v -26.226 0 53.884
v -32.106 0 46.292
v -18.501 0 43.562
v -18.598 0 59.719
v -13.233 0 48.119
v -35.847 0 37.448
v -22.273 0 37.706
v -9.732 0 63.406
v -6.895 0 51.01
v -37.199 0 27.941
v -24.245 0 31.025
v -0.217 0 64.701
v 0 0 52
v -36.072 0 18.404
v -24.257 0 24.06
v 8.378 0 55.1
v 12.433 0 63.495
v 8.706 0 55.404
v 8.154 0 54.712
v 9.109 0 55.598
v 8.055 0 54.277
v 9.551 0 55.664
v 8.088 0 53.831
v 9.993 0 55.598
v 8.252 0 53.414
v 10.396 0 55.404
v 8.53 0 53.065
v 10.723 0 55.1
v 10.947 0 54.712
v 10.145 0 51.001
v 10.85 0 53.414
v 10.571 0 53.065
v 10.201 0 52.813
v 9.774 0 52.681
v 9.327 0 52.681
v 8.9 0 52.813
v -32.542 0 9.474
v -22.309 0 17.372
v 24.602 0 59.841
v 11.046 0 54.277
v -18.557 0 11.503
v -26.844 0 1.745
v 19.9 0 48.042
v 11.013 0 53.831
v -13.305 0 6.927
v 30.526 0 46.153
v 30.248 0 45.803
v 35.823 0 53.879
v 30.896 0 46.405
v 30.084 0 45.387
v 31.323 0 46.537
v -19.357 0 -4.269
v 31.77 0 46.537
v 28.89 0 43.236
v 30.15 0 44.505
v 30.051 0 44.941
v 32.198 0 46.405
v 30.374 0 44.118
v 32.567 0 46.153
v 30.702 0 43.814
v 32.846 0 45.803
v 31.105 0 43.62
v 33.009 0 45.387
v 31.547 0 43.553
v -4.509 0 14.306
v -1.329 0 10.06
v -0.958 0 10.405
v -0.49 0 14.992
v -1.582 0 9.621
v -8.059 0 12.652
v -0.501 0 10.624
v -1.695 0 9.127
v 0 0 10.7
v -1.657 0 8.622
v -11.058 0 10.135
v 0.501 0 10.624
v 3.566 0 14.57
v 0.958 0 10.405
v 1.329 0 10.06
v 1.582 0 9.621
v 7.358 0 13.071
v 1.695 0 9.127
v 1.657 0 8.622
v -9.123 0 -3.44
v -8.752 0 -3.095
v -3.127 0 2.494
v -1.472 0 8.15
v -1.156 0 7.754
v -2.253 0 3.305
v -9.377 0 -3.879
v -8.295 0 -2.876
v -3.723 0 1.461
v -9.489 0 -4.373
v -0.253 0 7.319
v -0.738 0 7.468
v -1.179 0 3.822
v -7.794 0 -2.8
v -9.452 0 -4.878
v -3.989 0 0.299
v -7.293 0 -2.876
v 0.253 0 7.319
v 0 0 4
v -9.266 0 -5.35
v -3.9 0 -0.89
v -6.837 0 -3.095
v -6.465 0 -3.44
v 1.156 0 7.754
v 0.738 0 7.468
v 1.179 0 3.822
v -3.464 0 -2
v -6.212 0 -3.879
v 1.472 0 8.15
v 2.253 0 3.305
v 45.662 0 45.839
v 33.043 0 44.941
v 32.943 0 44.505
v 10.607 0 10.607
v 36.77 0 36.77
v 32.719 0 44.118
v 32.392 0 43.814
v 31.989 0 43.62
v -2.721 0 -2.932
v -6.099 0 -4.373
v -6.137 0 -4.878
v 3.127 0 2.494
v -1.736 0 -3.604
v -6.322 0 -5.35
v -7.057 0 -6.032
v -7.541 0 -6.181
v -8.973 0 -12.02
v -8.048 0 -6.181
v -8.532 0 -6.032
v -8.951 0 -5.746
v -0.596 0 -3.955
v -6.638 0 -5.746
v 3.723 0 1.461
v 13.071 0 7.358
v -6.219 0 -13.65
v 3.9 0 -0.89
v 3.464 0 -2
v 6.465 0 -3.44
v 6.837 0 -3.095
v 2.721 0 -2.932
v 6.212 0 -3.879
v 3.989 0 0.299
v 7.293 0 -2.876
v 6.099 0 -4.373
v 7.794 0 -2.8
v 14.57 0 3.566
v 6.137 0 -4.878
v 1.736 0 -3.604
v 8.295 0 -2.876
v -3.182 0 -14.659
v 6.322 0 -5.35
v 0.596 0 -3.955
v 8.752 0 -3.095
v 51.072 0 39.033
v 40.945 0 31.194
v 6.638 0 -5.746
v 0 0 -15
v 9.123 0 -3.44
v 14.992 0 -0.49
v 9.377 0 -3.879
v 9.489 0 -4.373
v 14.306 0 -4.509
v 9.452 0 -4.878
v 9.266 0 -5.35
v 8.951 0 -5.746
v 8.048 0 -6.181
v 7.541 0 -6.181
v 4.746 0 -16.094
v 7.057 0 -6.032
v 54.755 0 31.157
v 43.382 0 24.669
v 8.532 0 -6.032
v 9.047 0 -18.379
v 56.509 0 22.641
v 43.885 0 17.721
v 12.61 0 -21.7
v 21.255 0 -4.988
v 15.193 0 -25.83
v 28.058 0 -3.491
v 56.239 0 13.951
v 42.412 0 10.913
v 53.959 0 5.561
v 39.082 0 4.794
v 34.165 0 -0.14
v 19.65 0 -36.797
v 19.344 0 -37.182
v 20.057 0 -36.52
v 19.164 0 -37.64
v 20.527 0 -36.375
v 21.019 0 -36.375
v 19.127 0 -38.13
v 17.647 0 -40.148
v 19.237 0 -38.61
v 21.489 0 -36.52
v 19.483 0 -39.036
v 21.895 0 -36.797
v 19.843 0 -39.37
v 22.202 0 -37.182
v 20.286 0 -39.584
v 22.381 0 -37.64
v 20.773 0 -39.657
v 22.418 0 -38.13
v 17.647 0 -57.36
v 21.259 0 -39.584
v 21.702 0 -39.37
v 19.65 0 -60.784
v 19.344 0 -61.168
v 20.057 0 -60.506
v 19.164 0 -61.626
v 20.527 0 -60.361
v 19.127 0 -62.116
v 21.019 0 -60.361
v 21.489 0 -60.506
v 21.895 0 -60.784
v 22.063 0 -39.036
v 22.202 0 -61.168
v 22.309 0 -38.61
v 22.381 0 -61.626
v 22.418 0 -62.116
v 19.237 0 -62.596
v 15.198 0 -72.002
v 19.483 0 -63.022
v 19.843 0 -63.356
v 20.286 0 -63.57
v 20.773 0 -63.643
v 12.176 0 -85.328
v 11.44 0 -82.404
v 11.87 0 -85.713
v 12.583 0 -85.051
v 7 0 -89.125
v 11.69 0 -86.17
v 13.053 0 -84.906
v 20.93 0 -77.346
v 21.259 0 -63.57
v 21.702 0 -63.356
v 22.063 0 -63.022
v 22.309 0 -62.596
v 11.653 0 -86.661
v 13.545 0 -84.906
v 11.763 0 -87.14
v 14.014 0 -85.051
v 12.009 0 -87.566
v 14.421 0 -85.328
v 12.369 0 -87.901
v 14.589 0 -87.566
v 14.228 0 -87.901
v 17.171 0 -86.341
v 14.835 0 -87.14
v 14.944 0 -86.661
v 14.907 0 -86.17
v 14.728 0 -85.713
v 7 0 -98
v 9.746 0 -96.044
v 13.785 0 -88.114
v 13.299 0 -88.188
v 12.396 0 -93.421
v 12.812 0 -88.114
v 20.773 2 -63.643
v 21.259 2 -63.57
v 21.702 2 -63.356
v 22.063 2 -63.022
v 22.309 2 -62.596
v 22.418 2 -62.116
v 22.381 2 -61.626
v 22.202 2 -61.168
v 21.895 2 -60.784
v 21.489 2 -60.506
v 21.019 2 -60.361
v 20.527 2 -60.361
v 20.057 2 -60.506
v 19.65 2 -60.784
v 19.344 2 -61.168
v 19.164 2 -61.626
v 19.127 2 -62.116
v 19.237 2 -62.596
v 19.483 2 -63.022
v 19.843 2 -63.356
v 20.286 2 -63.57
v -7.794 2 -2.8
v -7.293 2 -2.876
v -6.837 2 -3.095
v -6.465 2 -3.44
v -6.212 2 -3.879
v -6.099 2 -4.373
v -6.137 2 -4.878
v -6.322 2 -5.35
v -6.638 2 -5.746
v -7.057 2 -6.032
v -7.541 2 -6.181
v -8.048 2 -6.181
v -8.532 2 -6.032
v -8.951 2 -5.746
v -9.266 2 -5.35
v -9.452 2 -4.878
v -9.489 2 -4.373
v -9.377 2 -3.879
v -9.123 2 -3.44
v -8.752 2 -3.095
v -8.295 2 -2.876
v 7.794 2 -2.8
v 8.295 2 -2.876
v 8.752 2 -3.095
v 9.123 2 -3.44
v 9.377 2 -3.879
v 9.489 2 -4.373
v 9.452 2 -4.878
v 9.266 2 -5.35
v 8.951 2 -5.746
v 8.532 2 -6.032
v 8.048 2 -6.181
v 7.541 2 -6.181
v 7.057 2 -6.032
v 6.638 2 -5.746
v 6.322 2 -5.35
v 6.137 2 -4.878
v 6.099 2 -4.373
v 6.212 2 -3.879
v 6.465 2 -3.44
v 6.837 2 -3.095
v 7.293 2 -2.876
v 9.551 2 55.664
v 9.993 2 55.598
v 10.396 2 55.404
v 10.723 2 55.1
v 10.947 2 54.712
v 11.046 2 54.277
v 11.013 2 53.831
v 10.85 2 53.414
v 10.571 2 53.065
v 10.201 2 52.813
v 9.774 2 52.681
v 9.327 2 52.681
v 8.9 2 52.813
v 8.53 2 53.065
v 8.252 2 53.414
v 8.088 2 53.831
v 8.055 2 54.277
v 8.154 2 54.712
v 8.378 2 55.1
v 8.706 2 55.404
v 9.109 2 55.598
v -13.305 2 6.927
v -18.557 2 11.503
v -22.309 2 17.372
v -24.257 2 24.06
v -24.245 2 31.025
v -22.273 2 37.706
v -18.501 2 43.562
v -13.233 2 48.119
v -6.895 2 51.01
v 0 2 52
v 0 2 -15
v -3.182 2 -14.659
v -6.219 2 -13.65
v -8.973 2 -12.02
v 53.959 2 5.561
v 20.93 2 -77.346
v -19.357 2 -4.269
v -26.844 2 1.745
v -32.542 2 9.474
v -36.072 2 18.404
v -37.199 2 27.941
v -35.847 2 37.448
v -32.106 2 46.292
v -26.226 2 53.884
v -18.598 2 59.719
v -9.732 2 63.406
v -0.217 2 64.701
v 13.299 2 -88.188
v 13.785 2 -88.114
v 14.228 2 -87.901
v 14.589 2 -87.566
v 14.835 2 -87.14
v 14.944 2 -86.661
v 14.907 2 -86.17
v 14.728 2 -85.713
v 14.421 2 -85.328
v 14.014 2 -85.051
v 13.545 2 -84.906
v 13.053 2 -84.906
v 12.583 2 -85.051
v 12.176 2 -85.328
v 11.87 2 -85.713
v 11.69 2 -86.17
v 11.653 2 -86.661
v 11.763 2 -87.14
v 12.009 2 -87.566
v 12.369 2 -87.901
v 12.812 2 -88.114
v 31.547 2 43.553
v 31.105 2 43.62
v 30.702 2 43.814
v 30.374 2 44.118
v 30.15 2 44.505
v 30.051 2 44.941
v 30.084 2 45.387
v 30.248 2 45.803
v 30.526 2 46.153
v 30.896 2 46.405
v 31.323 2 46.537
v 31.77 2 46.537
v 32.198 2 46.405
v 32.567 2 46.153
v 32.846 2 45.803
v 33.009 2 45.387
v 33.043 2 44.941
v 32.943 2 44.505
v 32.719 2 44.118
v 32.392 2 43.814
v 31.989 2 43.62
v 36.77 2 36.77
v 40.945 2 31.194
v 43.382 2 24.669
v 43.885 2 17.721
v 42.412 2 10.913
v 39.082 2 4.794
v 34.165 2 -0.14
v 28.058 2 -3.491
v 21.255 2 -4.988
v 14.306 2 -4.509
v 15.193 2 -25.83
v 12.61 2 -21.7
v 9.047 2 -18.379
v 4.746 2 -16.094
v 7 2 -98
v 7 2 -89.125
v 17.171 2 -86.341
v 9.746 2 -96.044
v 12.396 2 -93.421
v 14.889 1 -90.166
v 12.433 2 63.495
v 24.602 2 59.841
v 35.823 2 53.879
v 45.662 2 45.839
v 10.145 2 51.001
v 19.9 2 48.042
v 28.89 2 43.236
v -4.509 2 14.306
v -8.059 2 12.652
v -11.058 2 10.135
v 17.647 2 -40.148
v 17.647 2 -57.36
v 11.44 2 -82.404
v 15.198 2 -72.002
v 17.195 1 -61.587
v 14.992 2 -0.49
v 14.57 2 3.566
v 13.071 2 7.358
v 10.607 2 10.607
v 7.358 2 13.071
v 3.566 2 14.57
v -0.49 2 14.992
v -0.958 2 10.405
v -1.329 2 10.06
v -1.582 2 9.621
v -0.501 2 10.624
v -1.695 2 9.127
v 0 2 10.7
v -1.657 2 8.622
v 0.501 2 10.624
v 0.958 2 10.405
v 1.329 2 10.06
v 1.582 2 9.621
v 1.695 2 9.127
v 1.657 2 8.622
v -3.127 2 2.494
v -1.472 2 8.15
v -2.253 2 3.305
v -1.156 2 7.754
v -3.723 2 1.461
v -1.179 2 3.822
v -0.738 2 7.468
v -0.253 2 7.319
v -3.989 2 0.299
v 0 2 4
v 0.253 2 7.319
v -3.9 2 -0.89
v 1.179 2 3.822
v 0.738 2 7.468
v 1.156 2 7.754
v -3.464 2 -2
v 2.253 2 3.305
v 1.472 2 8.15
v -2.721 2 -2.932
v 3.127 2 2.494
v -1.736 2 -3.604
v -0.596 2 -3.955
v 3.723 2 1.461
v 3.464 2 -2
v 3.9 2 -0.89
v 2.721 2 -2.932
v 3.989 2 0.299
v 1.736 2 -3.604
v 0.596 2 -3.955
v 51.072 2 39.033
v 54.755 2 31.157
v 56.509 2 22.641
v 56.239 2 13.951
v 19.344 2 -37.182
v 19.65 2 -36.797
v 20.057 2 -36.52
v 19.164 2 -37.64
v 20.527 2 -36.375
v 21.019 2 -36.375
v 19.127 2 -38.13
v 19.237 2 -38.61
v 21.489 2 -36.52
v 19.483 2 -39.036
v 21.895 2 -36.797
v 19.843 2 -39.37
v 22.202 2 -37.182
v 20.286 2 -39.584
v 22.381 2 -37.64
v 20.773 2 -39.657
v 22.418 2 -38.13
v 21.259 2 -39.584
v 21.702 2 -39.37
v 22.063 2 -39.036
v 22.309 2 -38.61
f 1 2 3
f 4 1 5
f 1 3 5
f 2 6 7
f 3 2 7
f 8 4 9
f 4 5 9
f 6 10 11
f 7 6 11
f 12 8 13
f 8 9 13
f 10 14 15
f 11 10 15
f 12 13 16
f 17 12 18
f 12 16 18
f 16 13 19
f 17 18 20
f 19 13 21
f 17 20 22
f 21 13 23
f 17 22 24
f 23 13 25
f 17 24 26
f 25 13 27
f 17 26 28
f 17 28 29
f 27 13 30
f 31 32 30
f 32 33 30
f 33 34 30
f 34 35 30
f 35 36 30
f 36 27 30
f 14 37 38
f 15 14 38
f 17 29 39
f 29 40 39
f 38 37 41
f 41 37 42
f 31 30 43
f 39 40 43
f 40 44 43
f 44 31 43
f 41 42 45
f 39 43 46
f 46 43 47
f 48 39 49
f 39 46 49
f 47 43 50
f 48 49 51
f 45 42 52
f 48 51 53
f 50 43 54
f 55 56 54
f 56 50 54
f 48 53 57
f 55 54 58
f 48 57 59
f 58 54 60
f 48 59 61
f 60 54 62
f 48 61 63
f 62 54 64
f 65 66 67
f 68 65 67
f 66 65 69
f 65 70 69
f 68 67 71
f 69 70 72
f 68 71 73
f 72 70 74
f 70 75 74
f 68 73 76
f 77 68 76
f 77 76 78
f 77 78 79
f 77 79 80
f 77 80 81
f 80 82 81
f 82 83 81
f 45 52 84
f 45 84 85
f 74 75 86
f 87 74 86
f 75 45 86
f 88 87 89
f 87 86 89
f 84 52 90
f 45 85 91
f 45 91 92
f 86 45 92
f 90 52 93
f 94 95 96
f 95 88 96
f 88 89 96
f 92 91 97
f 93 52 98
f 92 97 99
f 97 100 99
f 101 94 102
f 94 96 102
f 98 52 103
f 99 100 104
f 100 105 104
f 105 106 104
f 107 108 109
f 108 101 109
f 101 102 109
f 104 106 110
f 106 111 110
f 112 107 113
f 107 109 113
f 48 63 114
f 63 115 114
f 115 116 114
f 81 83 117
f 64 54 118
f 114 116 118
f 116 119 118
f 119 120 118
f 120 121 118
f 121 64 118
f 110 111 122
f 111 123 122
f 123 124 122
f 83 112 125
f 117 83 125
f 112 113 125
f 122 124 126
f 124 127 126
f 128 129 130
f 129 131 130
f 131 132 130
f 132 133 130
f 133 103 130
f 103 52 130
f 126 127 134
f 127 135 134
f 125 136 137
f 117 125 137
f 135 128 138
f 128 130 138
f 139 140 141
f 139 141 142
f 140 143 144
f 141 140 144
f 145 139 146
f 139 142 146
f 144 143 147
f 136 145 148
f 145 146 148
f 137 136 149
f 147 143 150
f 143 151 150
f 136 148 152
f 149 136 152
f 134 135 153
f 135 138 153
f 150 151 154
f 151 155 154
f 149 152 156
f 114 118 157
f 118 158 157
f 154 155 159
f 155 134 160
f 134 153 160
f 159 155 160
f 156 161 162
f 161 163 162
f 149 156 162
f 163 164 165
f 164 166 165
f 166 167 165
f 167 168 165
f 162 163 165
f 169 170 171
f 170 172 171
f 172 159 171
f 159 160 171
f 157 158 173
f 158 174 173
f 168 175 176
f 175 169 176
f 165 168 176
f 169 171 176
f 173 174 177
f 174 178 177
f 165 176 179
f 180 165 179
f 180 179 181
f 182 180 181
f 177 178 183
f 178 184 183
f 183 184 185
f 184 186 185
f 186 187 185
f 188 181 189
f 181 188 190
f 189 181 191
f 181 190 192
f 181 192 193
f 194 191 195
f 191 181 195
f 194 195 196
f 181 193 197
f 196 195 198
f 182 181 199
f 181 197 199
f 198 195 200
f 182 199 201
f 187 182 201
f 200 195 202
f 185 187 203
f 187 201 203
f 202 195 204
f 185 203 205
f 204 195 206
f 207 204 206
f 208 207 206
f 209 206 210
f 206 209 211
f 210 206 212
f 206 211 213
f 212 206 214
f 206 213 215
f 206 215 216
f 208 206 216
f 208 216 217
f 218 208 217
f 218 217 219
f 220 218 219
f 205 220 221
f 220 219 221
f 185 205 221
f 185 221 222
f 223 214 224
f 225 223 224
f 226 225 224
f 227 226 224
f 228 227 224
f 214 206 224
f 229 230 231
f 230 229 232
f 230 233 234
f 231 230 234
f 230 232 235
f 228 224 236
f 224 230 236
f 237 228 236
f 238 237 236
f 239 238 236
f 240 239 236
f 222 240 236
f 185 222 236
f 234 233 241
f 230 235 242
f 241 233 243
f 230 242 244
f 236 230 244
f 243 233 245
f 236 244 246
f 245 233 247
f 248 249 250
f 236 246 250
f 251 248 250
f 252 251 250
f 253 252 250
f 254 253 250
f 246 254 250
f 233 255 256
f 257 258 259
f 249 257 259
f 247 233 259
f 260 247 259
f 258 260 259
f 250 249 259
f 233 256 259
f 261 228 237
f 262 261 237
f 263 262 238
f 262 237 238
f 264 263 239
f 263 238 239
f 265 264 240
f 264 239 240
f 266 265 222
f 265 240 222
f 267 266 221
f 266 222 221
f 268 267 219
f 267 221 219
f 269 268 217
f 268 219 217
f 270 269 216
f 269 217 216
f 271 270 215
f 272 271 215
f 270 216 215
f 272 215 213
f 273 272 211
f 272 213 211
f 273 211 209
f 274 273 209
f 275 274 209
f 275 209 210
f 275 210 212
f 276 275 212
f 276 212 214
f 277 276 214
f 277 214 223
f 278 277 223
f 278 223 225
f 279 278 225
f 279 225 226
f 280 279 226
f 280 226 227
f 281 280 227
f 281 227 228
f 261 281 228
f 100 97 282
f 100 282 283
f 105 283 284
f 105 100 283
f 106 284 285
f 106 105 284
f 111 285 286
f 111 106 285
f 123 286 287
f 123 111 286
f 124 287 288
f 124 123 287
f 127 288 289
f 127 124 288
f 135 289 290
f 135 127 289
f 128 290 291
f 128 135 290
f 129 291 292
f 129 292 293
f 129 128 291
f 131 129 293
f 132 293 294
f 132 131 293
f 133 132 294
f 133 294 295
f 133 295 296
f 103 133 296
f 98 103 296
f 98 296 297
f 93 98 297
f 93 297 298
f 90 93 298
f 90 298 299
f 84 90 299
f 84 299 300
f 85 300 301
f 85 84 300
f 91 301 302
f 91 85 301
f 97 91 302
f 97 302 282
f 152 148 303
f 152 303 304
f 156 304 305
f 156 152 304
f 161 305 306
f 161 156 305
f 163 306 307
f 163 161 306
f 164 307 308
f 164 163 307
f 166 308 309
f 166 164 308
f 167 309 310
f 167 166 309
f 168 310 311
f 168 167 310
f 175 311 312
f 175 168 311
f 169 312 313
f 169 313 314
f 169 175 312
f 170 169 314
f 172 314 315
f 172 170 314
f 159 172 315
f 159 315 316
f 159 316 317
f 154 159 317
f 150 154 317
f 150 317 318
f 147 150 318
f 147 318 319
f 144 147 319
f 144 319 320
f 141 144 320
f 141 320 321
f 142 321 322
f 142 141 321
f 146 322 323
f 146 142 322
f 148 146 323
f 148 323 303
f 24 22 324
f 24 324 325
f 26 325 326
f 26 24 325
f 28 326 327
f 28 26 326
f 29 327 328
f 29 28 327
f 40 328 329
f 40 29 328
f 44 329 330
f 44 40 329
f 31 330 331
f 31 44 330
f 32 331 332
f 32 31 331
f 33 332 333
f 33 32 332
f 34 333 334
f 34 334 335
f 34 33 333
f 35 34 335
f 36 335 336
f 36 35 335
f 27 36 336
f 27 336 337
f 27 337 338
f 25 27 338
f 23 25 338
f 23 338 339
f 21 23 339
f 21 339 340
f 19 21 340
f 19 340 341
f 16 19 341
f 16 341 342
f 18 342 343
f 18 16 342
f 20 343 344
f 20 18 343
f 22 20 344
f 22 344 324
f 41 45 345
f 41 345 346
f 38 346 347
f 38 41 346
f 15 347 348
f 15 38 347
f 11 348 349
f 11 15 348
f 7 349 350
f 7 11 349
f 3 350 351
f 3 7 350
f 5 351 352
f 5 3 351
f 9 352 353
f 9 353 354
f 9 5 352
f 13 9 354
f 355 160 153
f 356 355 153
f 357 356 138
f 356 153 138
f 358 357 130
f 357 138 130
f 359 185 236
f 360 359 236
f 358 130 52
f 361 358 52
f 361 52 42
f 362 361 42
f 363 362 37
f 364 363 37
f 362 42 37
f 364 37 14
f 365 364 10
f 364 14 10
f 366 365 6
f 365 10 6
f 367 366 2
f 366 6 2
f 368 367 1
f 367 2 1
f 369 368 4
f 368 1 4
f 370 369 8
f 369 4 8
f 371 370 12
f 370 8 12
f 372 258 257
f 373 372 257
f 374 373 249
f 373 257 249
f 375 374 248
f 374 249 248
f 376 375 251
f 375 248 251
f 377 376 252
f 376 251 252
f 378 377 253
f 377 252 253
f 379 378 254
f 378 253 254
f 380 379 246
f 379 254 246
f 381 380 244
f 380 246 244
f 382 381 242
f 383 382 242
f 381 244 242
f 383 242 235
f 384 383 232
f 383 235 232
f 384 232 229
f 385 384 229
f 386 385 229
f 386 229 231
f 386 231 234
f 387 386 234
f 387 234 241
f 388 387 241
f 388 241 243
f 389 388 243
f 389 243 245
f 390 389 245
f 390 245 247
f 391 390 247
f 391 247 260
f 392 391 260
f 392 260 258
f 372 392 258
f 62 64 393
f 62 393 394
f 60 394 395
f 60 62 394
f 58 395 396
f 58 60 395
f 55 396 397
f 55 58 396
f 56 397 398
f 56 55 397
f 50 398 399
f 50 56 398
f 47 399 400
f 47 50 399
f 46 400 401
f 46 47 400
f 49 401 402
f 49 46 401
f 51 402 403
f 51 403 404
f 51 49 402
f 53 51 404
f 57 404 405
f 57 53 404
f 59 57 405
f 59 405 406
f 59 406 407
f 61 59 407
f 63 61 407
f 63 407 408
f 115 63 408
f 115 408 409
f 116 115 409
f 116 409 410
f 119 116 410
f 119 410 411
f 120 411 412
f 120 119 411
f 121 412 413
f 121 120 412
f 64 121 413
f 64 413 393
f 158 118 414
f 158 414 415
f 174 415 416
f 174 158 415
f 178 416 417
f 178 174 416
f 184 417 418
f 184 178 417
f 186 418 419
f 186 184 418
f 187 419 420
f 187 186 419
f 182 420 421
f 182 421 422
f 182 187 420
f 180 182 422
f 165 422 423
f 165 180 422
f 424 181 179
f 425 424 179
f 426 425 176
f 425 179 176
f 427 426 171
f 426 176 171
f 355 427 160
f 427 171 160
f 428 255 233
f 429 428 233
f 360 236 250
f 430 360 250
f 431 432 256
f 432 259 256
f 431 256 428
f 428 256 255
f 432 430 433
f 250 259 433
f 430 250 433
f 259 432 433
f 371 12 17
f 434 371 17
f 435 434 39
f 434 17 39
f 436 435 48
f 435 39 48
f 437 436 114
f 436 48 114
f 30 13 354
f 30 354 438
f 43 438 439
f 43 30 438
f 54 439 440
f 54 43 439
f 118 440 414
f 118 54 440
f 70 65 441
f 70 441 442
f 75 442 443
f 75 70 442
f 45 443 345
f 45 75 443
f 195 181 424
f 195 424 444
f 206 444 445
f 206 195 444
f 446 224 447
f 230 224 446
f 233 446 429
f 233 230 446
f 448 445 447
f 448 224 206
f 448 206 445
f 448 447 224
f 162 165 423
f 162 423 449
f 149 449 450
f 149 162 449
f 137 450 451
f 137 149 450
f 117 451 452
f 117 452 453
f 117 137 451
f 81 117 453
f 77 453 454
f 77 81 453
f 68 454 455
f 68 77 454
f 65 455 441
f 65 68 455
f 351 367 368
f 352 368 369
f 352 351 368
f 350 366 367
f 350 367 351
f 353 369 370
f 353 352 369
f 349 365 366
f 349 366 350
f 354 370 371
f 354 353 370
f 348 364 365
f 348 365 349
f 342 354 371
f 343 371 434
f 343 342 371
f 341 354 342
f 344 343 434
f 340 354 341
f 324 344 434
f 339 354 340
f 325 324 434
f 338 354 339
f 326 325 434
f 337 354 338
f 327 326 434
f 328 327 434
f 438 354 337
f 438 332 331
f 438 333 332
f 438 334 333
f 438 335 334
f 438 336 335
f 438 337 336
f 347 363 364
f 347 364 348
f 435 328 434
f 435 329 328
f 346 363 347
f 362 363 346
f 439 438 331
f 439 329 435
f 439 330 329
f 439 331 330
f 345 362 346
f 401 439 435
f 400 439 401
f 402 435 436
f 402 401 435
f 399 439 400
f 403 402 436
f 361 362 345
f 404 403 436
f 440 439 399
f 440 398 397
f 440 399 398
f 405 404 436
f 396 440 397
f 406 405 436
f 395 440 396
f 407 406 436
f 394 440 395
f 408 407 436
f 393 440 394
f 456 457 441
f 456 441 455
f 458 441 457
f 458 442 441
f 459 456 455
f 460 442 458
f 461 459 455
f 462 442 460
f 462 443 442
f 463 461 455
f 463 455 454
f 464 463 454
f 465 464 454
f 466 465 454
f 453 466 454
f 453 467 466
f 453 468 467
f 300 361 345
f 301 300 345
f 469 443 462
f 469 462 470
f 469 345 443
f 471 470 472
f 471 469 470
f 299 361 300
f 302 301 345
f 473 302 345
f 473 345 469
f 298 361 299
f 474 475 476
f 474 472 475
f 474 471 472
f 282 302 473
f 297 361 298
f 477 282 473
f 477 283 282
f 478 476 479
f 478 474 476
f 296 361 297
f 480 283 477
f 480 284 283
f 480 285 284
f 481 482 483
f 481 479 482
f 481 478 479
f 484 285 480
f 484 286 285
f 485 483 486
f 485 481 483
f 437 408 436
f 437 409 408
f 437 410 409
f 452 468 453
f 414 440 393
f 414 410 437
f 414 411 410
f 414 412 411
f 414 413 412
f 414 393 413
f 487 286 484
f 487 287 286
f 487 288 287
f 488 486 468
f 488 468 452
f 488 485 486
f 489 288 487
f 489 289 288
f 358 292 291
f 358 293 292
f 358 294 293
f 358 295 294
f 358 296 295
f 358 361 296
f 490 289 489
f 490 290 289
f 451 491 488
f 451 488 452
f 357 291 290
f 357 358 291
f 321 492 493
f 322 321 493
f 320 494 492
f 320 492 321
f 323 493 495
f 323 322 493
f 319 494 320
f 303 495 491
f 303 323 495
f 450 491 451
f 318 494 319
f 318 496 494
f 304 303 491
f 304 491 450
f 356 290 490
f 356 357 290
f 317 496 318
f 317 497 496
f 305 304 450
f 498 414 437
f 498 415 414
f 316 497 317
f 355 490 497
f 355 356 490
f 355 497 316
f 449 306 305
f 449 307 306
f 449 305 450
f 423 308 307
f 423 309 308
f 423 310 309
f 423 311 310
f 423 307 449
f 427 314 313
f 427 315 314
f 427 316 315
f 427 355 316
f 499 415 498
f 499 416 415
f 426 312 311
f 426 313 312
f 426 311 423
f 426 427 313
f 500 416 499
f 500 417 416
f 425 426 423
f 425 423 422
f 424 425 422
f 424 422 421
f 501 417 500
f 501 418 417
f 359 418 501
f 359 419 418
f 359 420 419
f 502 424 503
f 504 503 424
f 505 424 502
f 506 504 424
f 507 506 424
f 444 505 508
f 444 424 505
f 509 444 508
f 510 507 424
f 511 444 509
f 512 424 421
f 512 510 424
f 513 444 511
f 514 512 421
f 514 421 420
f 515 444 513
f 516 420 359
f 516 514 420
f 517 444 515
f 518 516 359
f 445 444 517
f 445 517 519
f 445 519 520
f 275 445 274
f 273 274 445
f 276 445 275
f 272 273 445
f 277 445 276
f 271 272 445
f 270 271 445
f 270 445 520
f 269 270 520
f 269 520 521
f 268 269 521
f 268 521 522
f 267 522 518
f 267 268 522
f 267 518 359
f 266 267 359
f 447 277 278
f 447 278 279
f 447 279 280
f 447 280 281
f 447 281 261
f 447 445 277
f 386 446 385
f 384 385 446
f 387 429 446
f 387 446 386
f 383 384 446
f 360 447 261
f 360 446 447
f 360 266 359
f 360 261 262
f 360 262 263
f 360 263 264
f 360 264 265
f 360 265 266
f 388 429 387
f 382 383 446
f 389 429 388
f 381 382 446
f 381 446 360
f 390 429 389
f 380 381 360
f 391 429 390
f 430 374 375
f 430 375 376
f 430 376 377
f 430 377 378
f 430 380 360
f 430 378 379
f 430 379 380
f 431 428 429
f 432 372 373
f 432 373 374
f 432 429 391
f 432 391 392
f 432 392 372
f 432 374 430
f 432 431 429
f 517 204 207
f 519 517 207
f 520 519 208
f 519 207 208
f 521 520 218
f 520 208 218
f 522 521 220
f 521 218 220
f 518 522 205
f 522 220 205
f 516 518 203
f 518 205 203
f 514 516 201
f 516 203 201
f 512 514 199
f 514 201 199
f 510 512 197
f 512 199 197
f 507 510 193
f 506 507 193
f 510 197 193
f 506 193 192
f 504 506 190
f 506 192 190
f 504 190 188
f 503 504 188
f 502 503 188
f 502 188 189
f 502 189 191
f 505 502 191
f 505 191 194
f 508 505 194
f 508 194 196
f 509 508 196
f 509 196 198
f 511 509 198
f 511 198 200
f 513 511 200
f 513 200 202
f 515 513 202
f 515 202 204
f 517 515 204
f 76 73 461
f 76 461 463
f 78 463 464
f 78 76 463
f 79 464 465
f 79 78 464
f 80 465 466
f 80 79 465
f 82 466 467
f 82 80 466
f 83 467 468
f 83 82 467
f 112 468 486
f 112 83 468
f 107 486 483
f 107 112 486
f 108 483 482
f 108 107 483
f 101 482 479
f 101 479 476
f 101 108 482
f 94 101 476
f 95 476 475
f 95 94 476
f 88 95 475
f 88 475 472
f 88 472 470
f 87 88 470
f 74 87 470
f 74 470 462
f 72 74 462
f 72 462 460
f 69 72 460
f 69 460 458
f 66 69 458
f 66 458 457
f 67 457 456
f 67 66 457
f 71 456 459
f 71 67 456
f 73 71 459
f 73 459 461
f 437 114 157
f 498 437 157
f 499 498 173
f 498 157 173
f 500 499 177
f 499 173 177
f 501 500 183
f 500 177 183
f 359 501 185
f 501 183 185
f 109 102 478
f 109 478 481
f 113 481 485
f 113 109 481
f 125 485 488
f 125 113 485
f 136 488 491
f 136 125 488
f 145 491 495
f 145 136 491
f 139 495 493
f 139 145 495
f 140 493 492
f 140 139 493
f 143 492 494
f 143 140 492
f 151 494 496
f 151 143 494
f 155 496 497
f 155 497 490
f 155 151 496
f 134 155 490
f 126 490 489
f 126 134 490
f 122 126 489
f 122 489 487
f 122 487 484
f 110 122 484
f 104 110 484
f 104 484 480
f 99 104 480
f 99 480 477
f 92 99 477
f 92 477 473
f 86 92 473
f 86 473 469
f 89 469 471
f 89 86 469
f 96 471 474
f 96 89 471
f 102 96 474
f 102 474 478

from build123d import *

# Parameters (mm, degrees)
SKETCH_1_R          = 1.5
SKETCH_1_R_2        = 4
SKETCH_1_R_3        = 1.7
EXTRUDE_1_DEPTH     = 2
SKETCH_2_R          = 1.65
CUT_EXTRUDE_1_DEPTH = 114.211457996


with BuildPart() as part:
    # Эскиз1 → Бобышка-Вытянуть1 (new body)
    with BuildSketch(Plane(origin=(0, 0, 0), x_dir=(1, 0, 0), z_dir=(0, 1, 0))):
        with BuildLine():
            Line((53.958573959, -5.561349479), (20.929615764, 77.346018647))
            add(Edge.make_bspline(
                [(20.929615764, 77.346018647), (15.874013102, 92.823492357), (7, 98)],
                knots=[5.291070227, 5.291070227, 5.291070227, 5.999391198, 5.999391198, 5.999391198], degree=2, weights=[1, 0.937937966, 1]))
            Line((7, 98), (7, 89.125236548))
            add(Edge.make_bspline(
                [(15.192612979, 25.829512169), (26.645146253, 67.955139718), (7, 89.125236548)],
                knots=[4.109476107, 4.109476107, 4.109476107, 5.848164932, 5.848164932, 5.848164932], degree=2, weights=[1, 0.645327493, 1]))
            ThreePointArc((15.192612979, 25.829512169), (9.04718601, 18.379331895), (0, 15))
            ThreePointArc((0, 15), (-4.727432256, 14.235567578), (-8.97302418, 12.020184569))
            Line((-8.97302418, 12.020184569), (-19.356829743, 4.268711381))
            ThreePointArc((-19.356829743, 4.268711381), (-35.846538498, -37.448042935), (-0.216613019, -64.70068493))
            ThreePointArc((-0.216613019, -64.70068493), (24.602337984, -59.841043752), (45.662397444, -45.83853195))
            ThreePointArc((45.662397444, -45.83853195), (55.881669425, -26.950465422), (53.958573959, -5.561349479))
        make_face()
        with Locations(Location((9.550649772, -54.164426416, 0), (0, 0, 270))):
            Circle(SKETCH_1_R, mode=Mode.SUBTRACT)
        with Locations(Location((31.546703999, -45.053362436, 0), (0, 0, 90))):
            Circle(SKETCH_1_R, mode=Mode.SUBTRACT)
        with Locations(Location((0, 0, 0), (0, 0, 270))):
            Circle(SKETCH_1_R_2, mode=Mode.SUBTRACT)
        with Locations(Location((0, -9, 0), (0, 0, 270))):
            Circle(SKETCH_1_R_3, mode=Mode.SUBTRACT)
        with Locations(Location((-7.794228634, 4.5, 0), (0, 0, 270))):
            Circle(SKETCH_1_R_3, mode=Mode.SUBTRACT)
        with Locations(Location((7.794228634, 4.5, 0), (0, 0, 270))):
            Circle(SKETCH_1_R_3, mode=Mode.SUBTRACT)
        with BuildLine():
            ThreePointArc((0, -52), (19.899538483, -48.041735691), (36.769552622, -36.769552622))
            ThreePointArc((36.769552622, -36.769552622), (40.965347854, -7.734611808), (14.306107991, 4.50946495))
            ThreePointArc((14.306107991, 4.50946495), (10.606601718, -10.606601718), (-4.50946495, -14.306107991))
            ThreePointArc((-4.50946495, -14.306107991), (-9.64091288, -11.491422838), (-13.304619219, -6.927272727))
            ThreePointArc((-13.304619219, -6.927272727), (-23.497678802, -34.43607172), (0, -52))
        make_face(mode=Mode.SUBTRACT)
    extrude(amount=EXTRUDE_1_DEPTH)

    # Эскиз2 → Вырез-Вытянуть1 (cut, through all)
    with BuildSketch(Plane.XZ):
        with Locations(Location((20.772601242, -38.006933081, 0), (0, 0, 270))):
            Circle(SKETCH_2_R)
        with Locations(Location((13.298587158, -86.537567928, 0), (0, 0, 270))):
            Circle(SKETCH_2_R)
        with Locations(Location((20.772601242, -61.993066919, 0), (0, 0, 270))):
            Circle(SKETCH_2_R)
    extrude(amount=-CUT_EXTRUDE_1_DEPTH, mode=Mode.SUBTRACT)


solid = part.part
